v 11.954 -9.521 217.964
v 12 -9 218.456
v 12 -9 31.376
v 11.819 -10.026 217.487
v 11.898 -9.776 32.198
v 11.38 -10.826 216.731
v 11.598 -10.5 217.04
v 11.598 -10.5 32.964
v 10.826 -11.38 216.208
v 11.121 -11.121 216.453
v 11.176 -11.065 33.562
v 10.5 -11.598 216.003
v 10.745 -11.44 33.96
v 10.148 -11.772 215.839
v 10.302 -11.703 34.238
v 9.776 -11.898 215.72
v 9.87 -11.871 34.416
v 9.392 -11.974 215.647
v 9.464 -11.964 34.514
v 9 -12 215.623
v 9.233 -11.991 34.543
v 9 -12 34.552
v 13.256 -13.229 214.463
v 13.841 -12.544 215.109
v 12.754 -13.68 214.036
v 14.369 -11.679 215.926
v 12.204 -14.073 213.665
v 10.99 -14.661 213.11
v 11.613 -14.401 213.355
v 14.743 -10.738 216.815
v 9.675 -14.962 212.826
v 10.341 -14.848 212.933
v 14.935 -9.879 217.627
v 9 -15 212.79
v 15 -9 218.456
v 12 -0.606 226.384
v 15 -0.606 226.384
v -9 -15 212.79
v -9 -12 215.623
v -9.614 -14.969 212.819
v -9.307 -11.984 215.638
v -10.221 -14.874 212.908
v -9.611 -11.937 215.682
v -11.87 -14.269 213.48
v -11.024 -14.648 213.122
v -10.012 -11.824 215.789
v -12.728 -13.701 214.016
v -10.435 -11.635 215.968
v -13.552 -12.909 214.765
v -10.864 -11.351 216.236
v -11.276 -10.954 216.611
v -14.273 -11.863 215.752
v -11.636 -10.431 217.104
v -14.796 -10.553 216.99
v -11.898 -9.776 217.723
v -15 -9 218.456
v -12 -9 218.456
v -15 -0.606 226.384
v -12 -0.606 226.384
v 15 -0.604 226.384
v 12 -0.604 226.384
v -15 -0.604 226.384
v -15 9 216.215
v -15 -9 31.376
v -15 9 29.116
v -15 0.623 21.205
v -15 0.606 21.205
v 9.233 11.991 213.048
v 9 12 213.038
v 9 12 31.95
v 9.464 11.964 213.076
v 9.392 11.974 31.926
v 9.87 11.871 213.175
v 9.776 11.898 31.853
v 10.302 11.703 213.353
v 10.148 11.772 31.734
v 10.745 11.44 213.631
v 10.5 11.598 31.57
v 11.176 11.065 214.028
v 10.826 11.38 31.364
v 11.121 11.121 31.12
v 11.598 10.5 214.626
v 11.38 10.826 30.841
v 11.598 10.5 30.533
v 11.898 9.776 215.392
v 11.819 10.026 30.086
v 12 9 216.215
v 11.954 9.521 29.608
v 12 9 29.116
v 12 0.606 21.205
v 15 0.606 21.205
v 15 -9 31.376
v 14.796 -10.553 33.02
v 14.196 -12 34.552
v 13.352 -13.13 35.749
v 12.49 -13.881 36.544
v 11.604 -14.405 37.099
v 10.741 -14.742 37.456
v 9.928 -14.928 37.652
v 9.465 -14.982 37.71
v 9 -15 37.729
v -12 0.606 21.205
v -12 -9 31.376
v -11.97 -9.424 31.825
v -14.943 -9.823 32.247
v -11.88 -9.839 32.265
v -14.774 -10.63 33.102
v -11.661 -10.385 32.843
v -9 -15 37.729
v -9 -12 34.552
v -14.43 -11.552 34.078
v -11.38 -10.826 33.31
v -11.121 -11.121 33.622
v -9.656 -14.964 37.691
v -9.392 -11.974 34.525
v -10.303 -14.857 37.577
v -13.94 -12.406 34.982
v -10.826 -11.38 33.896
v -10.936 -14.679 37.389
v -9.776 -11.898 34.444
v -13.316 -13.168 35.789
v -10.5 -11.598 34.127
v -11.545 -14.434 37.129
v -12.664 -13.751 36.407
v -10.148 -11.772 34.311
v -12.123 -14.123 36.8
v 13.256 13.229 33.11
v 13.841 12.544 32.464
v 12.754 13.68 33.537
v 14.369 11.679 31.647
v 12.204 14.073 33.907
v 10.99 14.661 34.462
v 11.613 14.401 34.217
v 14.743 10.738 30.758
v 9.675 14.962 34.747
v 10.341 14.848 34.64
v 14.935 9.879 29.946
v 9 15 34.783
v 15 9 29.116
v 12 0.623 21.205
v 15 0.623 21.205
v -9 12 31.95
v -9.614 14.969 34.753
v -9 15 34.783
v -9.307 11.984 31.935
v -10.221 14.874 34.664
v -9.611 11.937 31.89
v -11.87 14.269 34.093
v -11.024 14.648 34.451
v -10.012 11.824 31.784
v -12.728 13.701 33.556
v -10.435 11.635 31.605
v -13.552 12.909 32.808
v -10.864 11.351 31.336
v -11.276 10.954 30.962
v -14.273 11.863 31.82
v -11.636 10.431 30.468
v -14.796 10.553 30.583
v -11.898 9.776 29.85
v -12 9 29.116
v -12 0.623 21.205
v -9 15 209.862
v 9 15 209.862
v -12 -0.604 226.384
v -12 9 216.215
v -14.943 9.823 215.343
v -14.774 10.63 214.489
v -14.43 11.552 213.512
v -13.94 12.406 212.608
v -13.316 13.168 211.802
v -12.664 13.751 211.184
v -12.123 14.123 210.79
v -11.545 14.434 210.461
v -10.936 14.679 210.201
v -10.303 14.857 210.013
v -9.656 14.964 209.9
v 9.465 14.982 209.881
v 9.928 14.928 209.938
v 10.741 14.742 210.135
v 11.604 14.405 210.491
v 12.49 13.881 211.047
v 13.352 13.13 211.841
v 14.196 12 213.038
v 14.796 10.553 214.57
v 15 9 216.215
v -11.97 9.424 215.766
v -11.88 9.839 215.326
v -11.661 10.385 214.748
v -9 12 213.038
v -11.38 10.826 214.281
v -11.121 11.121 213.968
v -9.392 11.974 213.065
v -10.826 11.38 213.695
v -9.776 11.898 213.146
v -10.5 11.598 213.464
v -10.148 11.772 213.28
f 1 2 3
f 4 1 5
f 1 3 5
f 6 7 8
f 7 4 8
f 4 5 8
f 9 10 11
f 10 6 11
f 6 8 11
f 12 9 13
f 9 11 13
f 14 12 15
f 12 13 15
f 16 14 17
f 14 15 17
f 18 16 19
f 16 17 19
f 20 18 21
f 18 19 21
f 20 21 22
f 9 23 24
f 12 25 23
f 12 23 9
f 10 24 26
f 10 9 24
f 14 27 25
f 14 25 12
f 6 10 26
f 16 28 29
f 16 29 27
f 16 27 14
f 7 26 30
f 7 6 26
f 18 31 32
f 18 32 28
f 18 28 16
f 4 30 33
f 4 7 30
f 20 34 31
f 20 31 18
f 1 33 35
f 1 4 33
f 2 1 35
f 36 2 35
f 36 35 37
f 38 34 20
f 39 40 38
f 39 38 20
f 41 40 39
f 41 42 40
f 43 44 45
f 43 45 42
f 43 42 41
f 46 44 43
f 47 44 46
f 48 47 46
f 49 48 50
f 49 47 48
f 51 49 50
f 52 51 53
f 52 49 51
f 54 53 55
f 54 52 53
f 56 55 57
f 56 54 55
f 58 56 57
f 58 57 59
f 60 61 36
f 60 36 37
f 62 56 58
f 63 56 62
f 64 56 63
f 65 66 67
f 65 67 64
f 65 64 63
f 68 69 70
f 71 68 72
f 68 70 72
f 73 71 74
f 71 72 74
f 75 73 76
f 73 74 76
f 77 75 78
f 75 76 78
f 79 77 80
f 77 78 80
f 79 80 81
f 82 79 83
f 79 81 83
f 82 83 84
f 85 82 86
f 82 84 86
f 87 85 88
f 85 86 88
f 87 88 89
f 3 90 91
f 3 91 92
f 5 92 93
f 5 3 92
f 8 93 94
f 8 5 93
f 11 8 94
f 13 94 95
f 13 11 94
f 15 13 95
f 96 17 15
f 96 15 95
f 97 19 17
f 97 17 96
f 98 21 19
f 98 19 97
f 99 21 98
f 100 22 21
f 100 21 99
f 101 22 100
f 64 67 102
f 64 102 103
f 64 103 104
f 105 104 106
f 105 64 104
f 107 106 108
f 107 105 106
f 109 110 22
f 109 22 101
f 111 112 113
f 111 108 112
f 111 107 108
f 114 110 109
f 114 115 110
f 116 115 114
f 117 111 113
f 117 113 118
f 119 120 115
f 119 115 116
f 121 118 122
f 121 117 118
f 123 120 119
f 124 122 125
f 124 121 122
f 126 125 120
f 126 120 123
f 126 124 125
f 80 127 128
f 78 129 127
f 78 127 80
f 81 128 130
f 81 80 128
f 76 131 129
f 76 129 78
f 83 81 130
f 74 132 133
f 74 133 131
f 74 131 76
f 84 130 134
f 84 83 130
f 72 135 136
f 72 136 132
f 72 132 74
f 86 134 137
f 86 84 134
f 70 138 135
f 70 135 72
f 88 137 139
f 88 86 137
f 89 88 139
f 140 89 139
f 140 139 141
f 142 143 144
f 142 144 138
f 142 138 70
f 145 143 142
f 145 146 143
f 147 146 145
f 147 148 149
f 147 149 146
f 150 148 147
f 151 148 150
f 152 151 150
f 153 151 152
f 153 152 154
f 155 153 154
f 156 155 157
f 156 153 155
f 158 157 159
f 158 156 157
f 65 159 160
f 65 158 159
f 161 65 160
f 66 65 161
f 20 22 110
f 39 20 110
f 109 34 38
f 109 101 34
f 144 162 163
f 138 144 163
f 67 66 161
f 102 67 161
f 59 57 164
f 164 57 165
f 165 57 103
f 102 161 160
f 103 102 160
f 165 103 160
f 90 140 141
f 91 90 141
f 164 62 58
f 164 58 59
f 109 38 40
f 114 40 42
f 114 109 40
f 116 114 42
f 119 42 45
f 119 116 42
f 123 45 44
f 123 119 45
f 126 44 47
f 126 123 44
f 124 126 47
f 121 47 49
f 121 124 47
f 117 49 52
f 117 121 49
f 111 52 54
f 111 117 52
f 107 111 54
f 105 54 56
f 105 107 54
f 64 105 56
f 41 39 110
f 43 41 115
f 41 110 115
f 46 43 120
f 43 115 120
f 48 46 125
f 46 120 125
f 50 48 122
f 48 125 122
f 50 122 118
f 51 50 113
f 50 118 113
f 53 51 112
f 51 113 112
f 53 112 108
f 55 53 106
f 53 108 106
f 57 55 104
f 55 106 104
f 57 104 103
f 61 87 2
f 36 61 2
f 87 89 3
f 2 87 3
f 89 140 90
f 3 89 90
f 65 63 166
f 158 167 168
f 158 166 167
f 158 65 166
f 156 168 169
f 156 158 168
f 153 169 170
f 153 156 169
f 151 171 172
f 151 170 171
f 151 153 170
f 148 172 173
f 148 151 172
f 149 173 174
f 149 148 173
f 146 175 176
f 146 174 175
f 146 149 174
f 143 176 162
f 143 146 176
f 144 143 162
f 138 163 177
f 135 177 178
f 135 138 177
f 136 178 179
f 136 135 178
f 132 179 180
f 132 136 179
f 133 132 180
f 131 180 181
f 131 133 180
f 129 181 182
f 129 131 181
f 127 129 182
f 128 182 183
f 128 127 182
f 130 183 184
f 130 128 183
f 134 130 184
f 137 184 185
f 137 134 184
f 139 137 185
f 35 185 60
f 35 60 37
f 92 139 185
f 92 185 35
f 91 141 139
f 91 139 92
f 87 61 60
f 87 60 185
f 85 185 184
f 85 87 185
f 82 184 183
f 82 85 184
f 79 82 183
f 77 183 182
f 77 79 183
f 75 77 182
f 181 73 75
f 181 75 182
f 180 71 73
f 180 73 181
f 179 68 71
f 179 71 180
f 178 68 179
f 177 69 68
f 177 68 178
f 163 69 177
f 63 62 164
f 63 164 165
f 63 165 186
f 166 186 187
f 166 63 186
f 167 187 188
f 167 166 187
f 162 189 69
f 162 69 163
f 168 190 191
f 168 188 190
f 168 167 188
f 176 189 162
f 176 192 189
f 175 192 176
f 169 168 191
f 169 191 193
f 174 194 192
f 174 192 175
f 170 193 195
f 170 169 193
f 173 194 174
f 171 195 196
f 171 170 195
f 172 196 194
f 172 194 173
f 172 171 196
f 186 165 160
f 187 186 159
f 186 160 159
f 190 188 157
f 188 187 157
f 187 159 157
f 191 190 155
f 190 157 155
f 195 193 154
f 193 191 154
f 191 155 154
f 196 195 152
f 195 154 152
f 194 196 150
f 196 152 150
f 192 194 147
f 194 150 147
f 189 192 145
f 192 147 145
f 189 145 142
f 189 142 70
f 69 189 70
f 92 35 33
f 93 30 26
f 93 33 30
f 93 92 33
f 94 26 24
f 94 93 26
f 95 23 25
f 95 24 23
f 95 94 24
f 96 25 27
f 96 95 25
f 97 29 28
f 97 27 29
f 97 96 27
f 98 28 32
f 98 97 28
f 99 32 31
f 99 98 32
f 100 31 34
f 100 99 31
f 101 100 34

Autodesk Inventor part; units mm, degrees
ref_plane "Start plane" through (0, 0, 21.2046) normal (0, 0, 1) x (1, 0, 0)
ref_plane "End plane" through (0, 0, 226.3838) normal (0, 0, 1) x (1, 0, 0)
sketch "Sketch" plane through (0, 0, 0) normal (0, 0, 1) x (1, 0, 0)
  line L0 (-15, -9) -> (-15, 9)
  line L1 (-9, 15) -> (9, 15)
  line L2 (15, 9) -> (15, -9)
  line L3 (9, -15) -> (-9, -15)
  arc A0 (-15, -9) -> (-9, -15) centre (-9, -9) ccw
  arc A1 (-9, 15) -> (-15, 9) centre (-9, 9) ccw
  arc A2 (15, 9) -> (9, 15) centre (9, 9) ccw
  arc A3 (9, -15) -> (15, -9) centre (9, -9) ccw
  arc A4 (-9, 12) -> (-12, 9) centre (-9, 9) ccw
  line L4 (-9, 12) -> (9, 12)
  arc A5 (12, 9) -> (9, 12) centre (9, 9) ccw
  line L5 (12, 9) -> (12, -9)
  arc A6 (9, -12) -> (12, -9) centre (9, -9) ccw
  line L6 (9, -12) -> (-9, -12)
  arc A7 (-12, -9) -> (-9, -12) centre (-9, -9) ccw
  line L7 (-12, -9) -> (-12, 9)
  line L8 (0, 22.7397) -> (0, -22.7397) construction
  line L9 (-22.7397, 0) -> (22.7397, 0) construction
  dimension "d7" = 6
  dimension "d10" = 30
  dimension "d11" = 30
  dimension "d12" = 3
  dimension "d15" = 15
  dimension "d16" = 15
extrude "Body" add sketch "Sketch" along normal up to surface (205.1793 mm away) from surface at 21.2046
sketch "Sketch3" plane through (0, 0, 0) normal (0, 0, 1) x (1, 0, 0)
  line L0 (0, 0) -> (10, 0)
ref_plane "Work Plane3" through (0, 0, 0) normal (0, -1, 0) x (1, 0, 0)
ref_plane "Work Plane4" through (9, 112.687, 106.4266) normal (0, 0.727, 0.6866) x (1, 0, 0)
split "Split1" plane through (9, 112.687, 106.4266) removes the side toward (0, 0.727, 0.6866)
ref_plane "Work Plane5" through (9, 10.2994, 236.6832) normal (0, -0.6866, 0.727) x (1, 0, 0)
split "Split2" plane through (9, 10.2994, 236.6832) removes the side toward (0, -0.6866, 0.727)
ref_plane "Work Plane6" through (9, -1028.8448, -951.0544) normal (0, 0.6866, -0.727) x (1, 0, 0)
split "Split3" plane through (9, -1028.8448, -951.0544) removes the side toward (0, 0.6866, -0.727)
ref_plane "Work Plane7" through (-9, 10.9052, 10.2994) normal (0, -0.727, -0.6866) x (1, 0, 0)
split "Split4" plane through (-9, 10.9052, 10.2994) removes the side toward (0, -0.727, -0.6866)
sketch "Sketch4" plane through (0, 0, 0) normal (0, -1, 0) x (1, 0, 0)
  line L0 (-2, 21.2046) -> (12, 21.2046) projected
  line L1 (-2, 226.3838) -> (12, 226.3838) projected
  dimension "d18" = 205.1793
equation "\"d7\" = G_IR"
equation "\"d10\" = G_H"
equation "\"d11\" = G_W"
equation "\"d12\" = G_T"
equation "\"d15\" = 0.5 * d10"
equation "\"d16\" = 0.5 * d11"
equation "\"d3\" = G_L"
equation "\"G_W\" = 30"
equation "\"G_H\" = 30"
equation "\"G_T\" = 3"
equation "\"G_IR\" = 6"
equation "\"G_L\" = d18"
equation "\"G_OFFSET_START\" = -21.20455"
equation "\"G_OFFSET_END\" = -21.20455"
equation "\"d13\" = -G_OFFSET_START"
equation "\"d14\" = G_OFFSET_END + B_L"
equation "\"B_L\" = 247.58837"
properties part number "DIN EN 10219-2 - 30 x 30 x 3  - 205.18" material "Steel, Mild"
